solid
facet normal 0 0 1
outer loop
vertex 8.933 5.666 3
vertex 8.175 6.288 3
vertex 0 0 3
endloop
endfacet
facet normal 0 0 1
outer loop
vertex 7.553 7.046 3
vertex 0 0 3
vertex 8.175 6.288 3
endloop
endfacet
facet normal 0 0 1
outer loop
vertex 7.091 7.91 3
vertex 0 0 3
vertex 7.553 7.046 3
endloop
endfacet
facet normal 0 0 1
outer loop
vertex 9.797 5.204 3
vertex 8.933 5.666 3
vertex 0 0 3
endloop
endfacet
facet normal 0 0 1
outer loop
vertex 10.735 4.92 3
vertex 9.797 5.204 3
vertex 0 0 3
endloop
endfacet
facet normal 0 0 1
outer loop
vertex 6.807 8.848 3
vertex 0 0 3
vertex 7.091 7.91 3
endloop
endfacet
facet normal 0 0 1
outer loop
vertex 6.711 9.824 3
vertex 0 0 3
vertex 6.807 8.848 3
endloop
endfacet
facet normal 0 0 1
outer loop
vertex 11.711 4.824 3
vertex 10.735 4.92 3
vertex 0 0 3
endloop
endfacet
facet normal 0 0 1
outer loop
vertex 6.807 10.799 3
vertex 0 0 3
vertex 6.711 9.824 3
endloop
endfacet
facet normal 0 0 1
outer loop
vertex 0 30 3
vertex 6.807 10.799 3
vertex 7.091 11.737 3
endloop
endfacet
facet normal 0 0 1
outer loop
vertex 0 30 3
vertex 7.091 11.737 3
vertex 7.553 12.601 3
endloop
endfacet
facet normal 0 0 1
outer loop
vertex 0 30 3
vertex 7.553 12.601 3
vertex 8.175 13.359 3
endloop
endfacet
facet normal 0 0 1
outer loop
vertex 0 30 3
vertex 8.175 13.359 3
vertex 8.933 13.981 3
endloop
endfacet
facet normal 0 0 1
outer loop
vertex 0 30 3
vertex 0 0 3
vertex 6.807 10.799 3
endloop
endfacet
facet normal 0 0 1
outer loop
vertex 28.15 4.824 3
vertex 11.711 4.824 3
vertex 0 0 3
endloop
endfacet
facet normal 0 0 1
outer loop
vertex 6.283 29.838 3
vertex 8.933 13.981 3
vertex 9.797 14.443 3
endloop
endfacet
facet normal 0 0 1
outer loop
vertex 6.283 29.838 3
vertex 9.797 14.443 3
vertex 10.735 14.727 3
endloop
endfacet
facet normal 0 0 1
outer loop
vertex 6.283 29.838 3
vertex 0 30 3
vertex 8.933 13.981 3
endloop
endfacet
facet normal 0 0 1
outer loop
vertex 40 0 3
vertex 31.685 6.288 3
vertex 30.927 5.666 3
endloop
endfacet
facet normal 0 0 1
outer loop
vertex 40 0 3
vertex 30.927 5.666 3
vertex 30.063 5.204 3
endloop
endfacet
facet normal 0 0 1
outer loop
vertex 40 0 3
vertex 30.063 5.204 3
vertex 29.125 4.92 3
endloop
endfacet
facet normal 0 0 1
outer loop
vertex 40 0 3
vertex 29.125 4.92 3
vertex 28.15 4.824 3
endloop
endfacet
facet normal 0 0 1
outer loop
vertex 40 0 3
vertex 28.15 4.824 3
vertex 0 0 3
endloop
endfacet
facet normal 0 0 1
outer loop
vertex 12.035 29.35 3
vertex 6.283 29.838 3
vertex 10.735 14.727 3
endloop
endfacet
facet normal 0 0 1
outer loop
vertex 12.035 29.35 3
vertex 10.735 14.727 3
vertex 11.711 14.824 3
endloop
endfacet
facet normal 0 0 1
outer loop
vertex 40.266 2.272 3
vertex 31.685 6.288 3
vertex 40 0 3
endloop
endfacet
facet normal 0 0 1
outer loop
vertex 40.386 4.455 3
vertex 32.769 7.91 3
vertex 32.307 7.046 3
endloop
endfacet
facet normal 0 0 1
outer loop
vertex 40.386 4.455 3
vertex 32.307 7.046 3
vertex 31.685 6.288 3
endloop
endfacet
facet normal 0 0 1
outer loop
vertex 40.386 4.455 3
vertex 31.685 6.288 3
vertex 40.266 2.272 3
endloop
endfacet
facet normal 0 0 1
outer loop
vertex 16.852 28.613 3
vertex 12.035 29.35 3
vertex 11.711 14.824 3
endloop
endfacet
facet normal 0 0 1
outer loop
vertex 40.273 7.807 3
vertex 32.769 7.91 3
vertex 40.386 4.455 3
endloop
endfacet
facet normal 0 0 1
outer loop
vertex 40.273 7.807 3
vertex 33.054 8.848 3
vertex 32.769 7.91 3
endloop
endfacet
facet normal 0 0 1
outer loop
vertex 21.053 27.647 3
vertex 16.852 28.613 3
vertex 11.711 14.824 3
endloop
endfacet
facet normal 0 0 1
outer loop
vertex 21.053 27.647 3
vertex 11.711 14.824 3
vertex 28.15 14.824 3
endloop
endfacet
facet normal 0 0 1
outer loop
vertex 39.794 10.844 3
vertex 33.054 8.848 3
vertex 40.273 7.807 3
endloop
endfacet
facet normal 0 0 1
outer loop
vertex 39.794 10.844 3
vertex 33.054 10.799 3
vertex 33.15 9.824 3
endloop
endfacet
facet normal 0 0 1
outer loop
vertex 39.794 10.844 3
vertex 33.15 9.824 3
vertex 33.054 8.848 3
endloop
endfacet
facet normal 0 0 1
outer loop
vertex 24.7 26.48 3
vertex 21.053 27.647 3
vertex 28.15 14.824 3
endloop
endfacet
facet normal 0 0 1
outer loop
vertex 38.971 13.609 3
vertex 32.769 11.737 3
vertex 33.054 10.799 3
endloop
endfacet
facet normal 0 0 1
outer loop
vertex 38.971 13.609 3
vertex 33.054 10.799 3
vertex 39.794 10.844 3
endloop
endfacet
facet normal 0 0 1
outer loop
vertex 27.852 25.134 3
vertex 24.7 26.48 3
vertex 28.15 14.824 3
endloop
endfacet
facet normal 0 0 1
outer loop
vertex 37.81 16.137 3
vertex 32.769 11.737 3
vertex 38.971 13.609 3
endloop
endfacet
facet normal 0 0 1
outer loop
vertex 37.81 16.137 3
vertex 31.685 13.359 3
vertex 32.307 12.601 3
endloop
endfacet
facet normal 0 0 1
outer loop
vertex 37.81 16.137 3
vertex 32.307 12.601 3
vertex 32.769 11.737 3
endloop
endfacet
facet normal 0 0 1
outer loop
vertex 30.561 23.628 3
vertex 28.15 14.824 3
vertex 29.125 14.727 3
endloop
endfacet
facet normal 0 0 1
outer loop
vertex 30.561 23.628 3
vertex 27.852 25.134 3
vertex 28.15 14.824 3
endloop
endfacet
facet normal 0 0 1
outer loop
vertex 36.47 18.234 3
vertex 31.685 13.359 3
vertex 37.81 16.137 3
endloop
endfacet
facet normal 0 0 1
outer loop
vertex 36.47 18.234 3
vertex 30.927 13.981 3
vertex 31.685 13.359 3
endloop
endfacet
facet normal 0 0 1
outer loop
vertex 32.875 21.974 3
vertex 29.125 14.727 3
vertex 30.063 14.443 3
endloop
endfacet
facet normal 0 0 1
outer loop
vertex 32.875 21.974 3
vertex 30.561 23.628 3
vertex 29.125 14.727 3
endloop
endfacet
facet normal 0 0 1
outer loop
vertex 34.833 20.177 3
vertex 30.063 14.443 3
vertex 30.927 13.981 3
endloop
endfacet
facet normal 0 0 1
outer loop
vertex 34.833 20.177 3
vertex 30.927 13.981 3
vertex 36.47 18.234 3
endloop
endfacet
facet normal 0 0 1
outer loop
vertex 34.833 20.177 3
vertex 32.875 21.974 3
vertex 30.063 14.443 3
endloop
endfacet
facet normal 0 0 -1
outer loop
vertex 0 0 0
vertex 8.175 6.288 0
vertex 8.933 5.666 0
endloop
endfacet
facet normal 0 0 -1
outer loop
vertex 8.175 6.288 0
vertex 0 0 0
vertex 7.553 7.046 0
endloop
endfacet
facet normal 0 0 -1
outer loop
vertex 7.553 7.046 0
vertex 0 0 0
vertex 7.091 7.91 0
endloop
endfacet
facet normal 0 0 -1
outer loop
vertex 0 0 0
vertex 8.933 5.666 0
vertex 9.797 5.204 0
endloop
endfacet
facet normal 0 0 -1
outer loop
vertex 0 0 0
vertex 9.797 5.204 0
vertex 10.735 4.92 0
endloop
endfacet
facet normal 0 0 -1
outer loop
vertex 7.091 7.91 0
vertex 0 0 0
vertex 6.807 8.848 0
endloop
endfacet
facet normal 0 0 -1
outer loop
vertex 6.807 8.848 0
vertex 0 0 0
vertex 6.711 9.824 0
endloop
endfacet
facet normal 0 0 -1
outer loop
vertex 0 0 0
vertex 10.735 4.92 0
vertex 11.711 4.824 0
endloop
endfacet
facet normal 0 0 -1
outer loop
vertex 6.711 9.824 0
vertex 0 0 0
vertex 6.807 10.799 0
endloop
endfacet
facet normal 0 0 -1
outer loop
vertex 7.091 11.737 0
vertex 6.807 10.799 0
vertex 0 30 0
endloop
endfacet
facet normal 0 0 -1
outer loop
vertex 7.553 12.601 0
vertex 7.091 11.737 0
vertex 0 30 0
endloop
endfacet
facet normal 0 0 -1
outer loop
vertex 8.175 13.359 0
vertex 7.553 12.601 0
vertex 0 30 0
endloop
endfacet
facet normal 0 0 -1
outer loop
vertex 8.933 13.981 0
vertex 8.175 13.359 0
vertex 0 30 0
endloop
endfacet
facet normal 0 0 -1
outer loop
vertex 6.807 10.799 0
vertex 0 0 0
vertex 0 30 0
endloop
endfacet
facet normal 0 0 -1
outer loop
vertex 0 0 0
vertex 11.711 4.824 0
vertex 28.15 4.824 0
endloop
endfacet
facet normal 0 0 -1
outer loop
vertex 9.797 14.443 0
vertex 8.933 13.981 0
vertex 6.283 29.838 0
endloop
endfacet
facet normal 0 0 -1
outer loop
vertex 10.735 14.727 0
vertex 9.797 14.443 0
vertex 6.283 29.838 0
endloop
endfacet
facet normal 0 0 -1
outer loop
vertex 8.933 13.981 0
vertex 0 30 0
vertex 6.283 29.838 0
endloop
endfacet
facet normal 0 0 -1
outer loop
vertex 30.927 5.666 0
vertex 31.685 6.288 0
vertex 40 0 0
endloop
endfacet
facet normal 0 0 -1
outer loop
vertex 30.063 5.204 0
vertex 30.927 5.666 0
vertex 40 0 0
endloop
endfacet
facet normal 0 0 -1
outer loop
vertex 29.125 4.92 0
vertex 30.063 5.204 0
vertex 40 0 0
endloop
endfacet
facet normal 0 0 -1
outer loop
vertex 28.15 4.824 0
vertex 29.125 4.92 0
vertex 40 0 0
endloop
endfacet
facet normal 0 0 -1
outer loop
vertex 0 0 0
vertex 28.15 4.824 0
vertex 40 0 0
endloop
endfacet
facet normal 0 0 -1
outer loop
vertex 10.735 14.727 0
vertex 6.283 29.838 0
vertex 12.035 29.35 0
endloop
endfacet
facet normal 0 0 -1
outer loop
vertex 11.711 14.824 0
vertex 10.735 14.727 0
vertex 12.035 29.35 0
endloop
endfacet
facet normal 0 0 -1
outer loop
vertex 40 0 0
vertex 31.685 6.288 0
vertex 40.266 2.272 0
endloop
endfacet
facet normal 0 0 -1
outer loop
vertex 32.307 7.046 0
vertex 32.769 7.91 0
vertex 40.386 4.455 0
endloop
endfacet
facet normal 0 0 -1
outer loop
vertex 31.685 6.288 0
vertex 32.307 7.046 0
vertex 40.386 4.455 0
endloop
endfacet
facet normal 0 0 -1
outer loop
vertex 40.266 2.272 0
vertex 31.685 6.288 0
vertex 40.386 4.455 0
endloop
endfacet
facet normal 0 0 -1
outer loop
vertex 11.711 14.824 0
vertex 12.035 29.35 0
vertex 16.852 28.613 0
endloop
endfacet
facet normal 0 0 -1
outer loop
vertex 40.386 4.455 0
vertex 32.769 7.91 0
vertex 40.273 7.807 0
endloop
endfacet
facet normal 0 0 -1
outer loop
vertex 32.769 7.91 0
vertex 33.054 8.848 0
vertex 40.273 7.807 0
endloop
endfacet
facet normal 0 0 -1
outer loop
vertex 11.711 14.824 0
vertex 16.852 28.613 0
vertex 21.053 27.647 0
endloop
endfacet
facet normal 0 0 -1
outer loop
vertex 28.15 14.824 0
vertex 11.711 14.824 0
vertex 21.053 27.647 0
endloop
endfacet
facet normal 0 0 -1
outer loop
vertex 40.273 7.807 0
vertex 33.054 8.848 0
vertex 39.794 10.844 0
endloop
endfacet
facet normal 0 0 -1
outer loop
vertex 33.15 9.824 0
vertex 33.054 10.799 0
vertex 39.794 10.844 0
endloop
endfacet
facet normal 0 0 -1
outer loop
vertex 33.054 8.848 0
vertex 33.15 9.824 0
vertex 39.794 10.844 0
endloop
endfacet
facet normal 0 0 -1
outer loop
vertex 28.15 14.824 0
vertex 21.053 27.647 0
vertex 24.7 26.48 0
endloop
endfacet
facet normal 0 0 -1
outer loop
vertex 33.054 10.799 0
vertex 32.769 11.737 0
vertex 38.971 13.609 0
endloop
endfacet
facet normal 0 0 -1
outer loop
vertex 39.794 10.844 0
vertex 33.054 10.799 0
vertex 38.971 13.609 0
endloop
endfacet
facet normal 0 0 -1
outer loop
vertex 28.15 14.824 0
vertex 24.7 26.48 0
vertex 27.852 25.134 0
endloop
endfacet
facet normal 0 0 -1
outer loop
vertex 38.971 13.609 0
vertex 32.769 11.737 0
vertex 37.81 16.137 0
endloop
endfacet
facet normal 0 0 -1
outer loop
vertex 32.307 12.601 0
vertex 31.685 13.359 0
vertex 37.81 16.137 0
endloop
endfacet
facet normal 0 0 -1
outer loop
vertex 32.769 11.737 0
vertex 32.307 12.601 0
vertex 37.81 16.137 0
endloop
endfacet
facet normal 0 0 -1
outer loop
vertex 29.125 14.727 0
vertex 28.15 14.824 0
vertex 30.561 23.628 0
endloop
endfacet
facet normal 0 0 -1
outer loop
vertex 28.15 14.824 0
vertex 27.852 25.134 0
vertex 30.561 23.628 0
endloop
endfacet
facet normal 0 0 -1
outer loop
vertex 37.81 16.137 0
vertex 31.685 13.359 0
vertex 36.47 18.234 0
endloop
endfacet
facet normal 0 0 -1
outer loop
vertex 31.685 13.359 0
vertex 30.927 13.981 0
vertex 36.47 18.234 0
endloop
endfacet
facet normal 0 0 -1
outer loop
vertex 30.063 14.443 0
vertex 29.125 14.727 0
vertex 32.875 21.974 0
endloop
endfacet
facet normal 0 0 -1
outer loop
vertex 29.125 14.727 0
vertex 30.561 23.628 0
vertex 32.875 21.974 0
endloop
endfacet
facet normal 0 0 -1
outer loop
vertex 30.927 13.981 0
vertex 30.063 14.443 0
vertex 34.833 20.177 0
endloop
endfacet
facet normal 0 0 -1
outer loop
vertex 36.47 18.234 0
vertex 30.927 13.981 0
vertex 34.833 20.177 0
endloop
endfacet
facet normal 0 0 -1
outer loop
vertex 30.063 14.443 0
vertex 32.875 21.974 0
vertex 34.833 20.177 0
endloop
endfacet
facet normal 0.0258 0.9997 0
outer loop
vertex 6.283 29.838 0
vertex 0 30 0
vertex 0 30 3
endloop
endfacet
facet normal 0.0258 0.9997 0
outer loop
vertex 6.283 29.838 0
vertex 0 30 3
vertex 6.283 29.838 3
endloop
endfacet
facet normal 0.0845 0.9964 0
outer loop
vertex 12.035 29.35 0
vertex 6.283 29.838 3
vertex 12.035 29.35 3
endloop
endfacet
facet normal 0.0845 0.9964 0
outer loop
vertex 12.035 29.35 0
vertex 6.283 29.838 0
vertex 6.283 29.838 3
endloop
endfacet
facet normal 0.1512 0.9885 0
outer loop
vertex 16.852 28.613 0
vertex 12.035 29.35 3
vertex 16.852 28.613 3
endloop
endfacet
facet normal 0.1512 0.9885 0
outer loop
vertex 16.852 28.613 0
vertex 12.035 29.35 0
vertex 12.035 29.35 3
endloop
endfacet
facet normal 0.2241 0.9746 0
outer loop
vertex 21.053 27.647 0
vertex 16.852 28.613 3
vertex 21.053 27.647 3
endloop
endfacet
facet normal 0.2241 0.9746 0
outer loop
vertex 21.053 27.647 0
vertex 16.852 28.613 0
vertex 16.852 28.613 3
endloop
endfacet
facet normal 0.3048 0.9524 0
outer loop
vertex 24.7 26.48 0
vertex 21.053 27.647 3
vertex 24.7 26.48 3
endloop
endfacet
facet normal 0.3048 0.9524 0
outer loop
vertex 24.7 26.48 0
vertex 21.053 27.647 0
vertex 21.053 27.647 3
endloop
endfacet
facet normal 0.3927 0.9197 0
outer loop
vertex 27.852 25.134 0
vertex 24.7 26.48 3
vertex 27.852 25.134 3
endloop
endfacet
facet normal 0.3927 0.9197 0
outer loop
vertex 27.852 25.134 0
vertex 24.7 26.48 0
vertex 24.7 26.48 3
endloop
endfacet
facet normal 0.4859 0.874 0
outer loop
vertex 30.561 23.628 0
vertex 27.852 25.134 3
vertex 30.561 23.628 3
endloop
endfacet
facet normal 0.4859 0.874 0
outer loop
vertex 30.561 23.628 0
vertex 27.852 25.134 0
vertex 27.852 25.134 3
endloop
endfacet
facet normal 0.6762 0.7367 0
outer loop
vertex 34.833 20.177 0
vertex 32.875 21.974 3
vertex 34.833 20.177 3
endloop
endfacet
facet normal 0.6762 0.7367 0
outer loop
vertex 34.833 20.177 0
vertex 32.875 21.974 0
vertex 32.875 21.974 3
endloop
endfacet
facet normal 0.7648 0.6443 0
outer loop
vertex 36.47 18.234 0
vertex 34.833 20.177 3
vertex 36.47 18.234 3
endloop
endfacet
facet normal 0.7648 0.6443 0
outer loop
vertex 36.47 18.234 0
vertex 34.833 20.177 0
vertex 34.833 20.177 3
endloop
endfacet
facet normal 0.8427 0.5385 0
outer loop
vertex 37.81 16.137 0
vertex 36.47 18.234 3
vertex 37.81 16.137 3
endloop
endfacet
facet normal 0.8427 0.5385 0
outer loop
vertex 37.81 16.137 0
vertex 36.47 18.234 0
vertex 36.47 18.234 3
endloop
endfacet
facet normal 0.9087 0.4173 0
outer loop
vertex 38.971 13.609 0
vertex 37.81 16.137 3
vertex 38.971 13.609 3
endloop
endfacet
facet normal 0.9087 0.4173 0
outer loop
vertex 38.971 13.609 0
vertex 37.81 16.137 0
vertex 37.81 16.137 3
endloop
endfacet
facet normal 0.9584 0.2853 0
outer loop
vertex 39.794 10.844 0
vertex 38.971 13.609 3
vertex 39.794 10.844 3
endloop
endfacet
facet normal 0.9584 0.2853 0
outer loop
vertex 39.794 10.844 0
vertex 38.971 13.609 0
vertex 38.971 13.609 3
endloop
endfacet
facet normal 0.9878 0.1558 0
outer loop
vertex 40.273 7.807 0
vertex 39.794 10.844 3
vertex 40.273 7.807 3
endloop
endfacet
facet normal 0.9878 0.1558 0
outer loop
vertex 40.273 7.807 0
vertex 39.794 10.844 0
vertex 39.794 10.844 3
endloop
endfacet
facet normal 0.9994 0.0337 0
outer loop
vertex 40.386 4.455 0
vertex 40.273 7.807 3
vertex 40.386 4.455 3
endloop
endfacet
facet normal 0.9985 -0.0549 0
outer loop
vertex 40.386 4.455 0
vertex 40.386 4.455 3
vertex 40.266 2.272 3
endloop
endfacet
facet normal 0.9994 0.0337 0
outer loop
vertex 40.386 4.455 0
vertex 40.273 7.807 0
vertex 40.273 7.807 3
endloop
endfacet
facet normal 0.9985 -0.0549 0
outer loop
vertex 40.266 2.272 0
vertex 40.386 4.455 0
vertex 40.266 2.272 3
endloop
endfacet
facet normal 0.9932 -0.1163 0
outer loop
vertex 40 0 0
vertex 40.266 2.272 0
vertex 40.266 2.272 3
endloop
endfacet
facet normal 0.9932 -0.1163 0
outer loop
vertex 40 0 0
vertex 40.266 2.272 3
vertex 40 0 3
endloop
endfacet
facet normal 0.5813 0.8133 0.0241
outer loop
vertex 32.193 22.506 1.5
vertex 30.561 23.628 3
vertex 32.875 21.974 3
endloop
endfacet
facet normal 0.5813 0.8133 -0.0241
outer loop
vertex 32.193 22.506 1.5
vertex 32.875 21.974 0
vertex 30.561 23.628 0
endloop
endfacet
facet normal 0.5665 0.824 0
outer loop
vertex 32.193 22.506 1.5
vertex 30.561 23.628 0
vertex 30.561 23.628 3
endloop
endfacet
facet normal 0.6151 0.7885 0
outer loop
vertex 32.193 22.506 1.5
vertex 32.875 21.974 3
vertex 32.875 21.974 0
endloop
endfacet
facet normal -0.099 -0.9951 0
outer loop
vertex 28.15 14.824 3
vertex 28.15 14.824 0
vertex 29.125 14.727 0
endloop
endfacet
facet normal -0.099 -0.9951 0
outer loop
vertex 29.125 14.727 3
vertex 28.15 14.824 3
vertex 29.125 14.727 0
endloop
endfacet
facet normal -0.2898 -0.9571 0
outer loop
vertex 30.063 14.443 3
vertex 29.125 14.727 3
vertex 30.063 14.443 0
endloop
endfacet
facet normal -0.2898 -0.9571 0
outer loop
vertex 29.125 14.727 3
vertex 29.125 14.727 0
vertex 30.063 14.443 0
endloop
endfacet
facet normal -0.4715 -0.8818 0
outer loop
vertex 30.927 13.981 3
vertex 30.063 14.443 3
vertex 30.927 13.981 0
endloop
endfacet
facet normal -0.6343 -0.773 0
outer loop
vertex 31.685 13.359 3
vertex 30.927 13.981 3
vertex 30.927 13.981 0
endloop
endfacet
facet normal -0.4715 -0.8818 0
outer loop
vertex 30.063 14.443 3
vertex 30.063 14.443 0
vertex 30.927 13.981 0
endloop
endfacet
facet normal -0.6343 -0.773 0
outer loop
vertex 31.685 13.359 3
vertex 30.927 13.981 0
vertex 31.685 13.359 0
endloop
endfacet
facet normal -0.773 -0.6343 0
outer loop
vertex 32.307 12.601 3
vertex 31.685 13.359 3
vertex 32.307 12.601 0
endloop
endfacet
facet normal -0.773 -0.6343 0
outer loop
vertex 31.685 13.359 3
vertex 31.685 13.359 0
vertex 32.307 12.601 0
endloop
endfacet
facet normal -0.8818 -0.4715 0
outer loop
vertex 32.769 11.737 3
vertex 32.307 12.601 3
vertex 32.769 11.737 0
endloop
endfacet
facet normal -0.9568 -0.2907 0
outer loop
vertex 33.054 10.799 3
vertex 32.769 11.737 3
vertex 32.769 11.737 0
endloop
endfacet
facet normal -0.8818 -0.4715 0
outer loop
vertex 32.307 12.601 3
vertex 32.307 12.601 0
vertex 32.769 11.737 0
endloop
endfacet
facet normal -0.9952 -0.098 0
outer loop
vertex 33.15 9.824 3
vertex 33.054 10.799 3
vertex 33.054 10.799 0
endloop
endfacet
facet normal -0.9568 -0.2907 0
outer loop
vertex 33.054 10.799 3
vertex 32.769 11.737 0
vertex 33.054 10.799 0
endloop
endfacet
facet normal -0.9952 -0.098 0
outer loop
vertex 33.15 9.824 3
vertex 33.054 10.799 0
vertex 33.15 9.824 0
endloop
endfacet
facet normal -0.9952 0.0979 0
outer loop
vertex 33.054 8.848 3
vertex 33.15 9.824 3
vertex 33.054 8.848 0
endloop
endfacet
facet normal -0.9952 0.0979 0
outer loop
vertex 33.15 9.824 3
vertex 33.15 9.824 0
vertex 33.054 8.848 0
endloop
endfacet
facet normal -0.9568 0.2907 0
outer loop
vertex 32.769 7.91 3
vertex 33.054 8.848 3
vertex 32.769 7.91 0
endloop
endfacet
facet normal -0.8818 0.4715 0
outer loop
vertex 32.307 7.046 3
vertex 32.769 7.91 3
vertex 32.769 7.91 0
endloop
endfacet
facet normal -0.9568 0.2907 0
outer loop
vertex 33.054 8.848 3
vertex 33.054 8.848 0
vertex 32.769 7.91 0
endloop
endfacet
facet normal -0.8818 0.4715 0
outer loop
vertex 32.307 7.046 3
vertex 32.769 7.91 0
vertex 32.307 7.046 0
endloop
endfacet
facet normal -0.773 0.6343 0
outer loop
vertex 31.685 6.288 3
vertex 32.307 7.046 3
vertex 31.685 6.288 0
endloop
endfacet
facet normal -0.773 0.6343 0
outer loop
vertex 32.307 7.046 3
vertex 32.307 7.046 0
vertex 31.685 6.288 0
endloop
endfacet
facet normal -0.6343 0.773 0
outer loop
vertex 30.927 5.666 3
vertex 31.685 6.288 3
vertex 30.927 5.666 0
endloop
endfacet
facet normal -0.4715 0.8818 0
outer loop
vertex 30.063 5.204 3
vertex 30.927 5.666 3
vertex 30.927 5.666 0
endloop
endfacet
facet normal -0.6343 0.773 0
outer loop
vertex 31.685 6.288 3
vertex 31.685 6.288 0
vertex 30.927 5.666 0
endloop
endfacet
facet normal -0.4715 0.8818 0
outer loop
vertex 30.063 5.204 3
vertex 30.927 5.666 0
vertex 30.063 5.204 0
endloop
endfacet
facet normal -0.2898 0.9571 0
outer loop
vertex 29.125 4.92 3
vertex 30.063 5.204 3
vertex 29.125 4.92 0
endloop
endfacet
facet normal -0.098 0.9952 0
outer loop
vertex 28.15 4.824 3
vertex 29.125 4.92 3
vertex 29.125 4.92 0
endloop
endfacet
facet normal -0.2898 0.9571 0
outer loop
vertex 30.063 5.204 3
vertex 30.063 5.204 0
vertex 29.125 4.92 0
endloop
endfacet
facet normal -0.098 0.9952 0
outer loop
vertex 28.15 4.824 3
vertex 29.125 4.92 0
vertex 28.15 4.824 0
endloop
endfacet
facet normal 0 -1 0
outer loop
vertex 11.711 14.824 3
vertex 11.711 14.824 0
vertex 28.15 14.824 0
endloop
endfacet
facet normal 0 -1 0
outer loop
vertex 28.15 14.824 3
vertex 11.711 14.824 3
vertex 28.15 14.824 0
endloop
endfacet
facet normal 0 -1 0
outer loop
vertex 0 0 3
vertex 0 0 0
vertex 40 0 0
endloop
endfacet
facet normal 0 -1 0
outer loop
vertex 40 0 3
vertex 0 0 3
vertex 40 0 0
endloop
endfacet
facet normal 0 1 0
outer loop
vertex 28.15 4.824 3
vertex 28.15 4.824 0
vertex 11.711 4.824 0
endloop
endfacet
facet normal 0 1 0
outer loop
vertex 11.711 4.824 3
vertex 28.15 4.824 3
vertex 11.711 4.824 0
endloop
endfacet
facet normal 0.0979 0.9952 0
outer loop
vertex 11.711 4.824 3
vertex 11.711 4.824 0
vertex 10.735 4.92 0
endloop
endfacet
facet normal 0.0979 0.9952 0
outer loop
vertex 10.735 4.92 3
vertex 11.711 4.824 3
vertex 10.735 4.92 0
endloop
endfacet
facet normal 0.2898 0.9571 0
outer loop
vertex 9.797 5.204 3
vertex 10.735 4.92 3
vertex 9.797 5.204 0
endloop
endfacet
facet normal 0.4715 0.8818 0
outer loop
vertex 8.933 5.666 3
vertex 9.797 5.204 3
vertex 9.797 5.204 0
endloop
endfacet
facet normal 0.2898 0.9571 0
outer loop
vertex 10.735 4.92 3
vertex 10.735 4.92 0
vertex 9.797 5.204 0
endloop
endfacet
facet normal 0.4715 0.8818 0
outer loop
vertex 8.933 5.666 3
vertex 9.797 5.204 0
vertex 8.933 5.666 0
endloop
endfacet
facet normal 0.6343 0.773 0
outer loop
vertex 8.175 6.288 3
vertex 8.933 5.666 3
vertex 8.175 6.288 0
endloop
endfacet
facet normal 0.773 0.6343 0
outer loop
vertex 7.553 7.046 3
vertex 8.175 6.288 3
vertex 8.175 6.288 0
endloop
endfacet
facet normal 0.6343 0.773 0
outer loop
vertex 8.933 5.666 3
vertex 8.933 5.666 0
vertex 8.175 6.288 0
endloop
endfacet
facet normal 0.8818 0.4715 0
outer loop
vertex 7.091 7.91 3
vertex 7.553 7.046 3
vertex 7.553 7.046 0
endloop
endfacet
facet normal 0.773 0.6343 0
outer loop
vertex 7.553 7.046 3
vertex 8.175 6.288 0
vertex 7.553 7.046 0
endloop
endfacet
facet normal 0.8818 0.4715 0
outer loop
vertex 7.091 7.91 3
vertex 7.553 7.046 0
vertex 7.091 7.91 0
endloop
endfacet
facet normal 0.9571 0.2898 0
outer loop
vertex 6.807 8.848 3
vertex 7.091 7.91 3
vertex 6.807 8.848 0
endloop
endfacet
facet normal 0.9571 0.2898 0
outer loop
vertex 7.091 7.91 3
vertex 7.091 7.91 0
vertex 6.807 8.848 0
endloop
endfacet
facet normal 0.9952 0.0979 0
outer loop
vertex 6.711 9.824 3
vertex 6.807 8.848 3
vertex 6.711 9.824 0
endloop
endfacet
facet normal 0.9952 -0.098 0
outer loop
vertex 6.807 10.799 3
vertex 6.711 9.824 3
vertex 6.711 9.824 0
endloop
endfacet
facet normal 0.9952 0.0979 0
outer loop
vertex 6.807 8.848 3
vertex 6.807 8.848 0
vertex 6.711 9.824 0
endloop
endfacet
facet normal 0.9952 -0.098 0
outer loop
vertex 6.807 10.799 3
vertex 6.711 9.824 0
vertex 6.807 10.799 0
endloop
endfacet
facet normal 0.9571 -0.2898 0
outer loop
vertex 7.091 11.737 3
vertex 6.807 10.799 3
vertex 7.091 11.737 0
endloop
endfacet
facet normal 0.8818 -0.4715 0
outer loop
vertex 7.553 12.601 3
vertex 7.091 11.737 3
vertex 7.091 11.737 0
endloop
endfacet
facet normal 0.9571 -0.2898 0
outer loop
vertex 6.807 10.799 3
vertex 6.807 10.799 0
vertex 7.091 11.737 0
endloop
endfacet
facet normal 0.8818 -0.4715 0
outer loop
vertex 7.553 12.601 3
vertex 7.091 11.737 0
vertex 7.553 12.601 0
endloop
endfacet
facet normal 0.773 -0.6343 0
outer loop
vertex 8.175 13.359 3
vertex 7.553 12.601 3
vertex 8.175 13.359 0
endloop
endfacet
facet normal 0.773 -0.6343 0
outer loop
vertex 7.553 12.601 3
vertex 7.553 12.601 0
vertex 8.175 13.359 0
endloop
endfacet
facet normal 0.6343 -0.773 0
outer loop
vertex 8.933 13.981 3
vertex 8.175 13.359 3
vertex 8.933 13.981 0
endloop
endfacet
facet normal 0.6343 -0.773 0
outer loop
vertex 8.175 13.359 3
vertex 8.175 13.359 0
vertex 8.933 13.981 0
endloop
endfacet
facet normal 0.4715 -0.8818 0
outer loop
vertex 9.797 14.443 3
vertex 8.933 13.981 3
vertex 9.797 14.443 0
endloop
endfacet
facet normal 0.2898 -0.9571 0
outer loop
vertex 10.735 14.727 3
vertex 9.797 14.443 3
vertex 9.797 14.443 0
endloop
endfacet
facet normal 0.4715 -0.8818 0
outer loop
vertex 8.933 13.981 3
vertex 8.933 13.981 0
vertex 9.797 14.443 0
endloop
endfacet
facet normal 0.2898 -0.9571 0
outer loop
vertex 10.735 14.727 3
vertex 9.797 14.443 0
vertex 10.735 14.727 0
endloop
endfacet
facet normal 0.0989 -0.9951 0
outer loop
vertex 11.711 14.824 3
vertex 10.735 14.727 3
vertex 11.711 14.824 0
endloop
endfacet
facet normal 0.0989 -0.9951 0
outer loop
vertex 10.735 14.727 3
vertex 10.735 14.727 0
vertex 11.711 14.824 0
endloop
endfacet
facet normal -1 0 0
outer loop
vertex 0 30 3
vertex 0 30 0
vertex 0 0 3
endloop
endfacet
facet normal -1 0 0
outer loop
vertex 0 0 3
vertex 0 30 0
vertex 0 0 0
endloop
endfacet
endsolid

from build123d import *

# Parameters (mm, degrees)
BOSS_EXTRUDE2_DEPTH = 3


with BuildPart() as part:
    # Sketch1 → Boss-Extrude2 (new body)
    with BuildSketch(Plane.XY):
        with BuildLine():
            Line((0, 30), (0, 0))
            Line((0, 0), (40, 0))
            add(Edge.make_bspline(
                [(0, 30), (44.385466319, 30.011757551), (40, 0)],
                knots=[0, 0, 0, 1, 1, 1], degree=2))
        make_face()
        with BuildLine():
            Line((11.710831717, 14.823563468), (28.149637062, 14.823563468))
            ThreePointArc((28.149637062, 14.823563468), (33.149637062, 9.823563468), (28.149637062, 4.823563468))
            Line((28.149637062, 4.823563468), (11.710831717, 4.823563468))
            ThreePointArc((11.710831717, 4.823563468), (6.710831717, 9.823563468), (11.710831717, 14.823563468))
        make_face(mode=Mode.SUBTRACT)
    extrude(amount=BOSS_EXTRUDE2_DEPTH)


solid = part.part
